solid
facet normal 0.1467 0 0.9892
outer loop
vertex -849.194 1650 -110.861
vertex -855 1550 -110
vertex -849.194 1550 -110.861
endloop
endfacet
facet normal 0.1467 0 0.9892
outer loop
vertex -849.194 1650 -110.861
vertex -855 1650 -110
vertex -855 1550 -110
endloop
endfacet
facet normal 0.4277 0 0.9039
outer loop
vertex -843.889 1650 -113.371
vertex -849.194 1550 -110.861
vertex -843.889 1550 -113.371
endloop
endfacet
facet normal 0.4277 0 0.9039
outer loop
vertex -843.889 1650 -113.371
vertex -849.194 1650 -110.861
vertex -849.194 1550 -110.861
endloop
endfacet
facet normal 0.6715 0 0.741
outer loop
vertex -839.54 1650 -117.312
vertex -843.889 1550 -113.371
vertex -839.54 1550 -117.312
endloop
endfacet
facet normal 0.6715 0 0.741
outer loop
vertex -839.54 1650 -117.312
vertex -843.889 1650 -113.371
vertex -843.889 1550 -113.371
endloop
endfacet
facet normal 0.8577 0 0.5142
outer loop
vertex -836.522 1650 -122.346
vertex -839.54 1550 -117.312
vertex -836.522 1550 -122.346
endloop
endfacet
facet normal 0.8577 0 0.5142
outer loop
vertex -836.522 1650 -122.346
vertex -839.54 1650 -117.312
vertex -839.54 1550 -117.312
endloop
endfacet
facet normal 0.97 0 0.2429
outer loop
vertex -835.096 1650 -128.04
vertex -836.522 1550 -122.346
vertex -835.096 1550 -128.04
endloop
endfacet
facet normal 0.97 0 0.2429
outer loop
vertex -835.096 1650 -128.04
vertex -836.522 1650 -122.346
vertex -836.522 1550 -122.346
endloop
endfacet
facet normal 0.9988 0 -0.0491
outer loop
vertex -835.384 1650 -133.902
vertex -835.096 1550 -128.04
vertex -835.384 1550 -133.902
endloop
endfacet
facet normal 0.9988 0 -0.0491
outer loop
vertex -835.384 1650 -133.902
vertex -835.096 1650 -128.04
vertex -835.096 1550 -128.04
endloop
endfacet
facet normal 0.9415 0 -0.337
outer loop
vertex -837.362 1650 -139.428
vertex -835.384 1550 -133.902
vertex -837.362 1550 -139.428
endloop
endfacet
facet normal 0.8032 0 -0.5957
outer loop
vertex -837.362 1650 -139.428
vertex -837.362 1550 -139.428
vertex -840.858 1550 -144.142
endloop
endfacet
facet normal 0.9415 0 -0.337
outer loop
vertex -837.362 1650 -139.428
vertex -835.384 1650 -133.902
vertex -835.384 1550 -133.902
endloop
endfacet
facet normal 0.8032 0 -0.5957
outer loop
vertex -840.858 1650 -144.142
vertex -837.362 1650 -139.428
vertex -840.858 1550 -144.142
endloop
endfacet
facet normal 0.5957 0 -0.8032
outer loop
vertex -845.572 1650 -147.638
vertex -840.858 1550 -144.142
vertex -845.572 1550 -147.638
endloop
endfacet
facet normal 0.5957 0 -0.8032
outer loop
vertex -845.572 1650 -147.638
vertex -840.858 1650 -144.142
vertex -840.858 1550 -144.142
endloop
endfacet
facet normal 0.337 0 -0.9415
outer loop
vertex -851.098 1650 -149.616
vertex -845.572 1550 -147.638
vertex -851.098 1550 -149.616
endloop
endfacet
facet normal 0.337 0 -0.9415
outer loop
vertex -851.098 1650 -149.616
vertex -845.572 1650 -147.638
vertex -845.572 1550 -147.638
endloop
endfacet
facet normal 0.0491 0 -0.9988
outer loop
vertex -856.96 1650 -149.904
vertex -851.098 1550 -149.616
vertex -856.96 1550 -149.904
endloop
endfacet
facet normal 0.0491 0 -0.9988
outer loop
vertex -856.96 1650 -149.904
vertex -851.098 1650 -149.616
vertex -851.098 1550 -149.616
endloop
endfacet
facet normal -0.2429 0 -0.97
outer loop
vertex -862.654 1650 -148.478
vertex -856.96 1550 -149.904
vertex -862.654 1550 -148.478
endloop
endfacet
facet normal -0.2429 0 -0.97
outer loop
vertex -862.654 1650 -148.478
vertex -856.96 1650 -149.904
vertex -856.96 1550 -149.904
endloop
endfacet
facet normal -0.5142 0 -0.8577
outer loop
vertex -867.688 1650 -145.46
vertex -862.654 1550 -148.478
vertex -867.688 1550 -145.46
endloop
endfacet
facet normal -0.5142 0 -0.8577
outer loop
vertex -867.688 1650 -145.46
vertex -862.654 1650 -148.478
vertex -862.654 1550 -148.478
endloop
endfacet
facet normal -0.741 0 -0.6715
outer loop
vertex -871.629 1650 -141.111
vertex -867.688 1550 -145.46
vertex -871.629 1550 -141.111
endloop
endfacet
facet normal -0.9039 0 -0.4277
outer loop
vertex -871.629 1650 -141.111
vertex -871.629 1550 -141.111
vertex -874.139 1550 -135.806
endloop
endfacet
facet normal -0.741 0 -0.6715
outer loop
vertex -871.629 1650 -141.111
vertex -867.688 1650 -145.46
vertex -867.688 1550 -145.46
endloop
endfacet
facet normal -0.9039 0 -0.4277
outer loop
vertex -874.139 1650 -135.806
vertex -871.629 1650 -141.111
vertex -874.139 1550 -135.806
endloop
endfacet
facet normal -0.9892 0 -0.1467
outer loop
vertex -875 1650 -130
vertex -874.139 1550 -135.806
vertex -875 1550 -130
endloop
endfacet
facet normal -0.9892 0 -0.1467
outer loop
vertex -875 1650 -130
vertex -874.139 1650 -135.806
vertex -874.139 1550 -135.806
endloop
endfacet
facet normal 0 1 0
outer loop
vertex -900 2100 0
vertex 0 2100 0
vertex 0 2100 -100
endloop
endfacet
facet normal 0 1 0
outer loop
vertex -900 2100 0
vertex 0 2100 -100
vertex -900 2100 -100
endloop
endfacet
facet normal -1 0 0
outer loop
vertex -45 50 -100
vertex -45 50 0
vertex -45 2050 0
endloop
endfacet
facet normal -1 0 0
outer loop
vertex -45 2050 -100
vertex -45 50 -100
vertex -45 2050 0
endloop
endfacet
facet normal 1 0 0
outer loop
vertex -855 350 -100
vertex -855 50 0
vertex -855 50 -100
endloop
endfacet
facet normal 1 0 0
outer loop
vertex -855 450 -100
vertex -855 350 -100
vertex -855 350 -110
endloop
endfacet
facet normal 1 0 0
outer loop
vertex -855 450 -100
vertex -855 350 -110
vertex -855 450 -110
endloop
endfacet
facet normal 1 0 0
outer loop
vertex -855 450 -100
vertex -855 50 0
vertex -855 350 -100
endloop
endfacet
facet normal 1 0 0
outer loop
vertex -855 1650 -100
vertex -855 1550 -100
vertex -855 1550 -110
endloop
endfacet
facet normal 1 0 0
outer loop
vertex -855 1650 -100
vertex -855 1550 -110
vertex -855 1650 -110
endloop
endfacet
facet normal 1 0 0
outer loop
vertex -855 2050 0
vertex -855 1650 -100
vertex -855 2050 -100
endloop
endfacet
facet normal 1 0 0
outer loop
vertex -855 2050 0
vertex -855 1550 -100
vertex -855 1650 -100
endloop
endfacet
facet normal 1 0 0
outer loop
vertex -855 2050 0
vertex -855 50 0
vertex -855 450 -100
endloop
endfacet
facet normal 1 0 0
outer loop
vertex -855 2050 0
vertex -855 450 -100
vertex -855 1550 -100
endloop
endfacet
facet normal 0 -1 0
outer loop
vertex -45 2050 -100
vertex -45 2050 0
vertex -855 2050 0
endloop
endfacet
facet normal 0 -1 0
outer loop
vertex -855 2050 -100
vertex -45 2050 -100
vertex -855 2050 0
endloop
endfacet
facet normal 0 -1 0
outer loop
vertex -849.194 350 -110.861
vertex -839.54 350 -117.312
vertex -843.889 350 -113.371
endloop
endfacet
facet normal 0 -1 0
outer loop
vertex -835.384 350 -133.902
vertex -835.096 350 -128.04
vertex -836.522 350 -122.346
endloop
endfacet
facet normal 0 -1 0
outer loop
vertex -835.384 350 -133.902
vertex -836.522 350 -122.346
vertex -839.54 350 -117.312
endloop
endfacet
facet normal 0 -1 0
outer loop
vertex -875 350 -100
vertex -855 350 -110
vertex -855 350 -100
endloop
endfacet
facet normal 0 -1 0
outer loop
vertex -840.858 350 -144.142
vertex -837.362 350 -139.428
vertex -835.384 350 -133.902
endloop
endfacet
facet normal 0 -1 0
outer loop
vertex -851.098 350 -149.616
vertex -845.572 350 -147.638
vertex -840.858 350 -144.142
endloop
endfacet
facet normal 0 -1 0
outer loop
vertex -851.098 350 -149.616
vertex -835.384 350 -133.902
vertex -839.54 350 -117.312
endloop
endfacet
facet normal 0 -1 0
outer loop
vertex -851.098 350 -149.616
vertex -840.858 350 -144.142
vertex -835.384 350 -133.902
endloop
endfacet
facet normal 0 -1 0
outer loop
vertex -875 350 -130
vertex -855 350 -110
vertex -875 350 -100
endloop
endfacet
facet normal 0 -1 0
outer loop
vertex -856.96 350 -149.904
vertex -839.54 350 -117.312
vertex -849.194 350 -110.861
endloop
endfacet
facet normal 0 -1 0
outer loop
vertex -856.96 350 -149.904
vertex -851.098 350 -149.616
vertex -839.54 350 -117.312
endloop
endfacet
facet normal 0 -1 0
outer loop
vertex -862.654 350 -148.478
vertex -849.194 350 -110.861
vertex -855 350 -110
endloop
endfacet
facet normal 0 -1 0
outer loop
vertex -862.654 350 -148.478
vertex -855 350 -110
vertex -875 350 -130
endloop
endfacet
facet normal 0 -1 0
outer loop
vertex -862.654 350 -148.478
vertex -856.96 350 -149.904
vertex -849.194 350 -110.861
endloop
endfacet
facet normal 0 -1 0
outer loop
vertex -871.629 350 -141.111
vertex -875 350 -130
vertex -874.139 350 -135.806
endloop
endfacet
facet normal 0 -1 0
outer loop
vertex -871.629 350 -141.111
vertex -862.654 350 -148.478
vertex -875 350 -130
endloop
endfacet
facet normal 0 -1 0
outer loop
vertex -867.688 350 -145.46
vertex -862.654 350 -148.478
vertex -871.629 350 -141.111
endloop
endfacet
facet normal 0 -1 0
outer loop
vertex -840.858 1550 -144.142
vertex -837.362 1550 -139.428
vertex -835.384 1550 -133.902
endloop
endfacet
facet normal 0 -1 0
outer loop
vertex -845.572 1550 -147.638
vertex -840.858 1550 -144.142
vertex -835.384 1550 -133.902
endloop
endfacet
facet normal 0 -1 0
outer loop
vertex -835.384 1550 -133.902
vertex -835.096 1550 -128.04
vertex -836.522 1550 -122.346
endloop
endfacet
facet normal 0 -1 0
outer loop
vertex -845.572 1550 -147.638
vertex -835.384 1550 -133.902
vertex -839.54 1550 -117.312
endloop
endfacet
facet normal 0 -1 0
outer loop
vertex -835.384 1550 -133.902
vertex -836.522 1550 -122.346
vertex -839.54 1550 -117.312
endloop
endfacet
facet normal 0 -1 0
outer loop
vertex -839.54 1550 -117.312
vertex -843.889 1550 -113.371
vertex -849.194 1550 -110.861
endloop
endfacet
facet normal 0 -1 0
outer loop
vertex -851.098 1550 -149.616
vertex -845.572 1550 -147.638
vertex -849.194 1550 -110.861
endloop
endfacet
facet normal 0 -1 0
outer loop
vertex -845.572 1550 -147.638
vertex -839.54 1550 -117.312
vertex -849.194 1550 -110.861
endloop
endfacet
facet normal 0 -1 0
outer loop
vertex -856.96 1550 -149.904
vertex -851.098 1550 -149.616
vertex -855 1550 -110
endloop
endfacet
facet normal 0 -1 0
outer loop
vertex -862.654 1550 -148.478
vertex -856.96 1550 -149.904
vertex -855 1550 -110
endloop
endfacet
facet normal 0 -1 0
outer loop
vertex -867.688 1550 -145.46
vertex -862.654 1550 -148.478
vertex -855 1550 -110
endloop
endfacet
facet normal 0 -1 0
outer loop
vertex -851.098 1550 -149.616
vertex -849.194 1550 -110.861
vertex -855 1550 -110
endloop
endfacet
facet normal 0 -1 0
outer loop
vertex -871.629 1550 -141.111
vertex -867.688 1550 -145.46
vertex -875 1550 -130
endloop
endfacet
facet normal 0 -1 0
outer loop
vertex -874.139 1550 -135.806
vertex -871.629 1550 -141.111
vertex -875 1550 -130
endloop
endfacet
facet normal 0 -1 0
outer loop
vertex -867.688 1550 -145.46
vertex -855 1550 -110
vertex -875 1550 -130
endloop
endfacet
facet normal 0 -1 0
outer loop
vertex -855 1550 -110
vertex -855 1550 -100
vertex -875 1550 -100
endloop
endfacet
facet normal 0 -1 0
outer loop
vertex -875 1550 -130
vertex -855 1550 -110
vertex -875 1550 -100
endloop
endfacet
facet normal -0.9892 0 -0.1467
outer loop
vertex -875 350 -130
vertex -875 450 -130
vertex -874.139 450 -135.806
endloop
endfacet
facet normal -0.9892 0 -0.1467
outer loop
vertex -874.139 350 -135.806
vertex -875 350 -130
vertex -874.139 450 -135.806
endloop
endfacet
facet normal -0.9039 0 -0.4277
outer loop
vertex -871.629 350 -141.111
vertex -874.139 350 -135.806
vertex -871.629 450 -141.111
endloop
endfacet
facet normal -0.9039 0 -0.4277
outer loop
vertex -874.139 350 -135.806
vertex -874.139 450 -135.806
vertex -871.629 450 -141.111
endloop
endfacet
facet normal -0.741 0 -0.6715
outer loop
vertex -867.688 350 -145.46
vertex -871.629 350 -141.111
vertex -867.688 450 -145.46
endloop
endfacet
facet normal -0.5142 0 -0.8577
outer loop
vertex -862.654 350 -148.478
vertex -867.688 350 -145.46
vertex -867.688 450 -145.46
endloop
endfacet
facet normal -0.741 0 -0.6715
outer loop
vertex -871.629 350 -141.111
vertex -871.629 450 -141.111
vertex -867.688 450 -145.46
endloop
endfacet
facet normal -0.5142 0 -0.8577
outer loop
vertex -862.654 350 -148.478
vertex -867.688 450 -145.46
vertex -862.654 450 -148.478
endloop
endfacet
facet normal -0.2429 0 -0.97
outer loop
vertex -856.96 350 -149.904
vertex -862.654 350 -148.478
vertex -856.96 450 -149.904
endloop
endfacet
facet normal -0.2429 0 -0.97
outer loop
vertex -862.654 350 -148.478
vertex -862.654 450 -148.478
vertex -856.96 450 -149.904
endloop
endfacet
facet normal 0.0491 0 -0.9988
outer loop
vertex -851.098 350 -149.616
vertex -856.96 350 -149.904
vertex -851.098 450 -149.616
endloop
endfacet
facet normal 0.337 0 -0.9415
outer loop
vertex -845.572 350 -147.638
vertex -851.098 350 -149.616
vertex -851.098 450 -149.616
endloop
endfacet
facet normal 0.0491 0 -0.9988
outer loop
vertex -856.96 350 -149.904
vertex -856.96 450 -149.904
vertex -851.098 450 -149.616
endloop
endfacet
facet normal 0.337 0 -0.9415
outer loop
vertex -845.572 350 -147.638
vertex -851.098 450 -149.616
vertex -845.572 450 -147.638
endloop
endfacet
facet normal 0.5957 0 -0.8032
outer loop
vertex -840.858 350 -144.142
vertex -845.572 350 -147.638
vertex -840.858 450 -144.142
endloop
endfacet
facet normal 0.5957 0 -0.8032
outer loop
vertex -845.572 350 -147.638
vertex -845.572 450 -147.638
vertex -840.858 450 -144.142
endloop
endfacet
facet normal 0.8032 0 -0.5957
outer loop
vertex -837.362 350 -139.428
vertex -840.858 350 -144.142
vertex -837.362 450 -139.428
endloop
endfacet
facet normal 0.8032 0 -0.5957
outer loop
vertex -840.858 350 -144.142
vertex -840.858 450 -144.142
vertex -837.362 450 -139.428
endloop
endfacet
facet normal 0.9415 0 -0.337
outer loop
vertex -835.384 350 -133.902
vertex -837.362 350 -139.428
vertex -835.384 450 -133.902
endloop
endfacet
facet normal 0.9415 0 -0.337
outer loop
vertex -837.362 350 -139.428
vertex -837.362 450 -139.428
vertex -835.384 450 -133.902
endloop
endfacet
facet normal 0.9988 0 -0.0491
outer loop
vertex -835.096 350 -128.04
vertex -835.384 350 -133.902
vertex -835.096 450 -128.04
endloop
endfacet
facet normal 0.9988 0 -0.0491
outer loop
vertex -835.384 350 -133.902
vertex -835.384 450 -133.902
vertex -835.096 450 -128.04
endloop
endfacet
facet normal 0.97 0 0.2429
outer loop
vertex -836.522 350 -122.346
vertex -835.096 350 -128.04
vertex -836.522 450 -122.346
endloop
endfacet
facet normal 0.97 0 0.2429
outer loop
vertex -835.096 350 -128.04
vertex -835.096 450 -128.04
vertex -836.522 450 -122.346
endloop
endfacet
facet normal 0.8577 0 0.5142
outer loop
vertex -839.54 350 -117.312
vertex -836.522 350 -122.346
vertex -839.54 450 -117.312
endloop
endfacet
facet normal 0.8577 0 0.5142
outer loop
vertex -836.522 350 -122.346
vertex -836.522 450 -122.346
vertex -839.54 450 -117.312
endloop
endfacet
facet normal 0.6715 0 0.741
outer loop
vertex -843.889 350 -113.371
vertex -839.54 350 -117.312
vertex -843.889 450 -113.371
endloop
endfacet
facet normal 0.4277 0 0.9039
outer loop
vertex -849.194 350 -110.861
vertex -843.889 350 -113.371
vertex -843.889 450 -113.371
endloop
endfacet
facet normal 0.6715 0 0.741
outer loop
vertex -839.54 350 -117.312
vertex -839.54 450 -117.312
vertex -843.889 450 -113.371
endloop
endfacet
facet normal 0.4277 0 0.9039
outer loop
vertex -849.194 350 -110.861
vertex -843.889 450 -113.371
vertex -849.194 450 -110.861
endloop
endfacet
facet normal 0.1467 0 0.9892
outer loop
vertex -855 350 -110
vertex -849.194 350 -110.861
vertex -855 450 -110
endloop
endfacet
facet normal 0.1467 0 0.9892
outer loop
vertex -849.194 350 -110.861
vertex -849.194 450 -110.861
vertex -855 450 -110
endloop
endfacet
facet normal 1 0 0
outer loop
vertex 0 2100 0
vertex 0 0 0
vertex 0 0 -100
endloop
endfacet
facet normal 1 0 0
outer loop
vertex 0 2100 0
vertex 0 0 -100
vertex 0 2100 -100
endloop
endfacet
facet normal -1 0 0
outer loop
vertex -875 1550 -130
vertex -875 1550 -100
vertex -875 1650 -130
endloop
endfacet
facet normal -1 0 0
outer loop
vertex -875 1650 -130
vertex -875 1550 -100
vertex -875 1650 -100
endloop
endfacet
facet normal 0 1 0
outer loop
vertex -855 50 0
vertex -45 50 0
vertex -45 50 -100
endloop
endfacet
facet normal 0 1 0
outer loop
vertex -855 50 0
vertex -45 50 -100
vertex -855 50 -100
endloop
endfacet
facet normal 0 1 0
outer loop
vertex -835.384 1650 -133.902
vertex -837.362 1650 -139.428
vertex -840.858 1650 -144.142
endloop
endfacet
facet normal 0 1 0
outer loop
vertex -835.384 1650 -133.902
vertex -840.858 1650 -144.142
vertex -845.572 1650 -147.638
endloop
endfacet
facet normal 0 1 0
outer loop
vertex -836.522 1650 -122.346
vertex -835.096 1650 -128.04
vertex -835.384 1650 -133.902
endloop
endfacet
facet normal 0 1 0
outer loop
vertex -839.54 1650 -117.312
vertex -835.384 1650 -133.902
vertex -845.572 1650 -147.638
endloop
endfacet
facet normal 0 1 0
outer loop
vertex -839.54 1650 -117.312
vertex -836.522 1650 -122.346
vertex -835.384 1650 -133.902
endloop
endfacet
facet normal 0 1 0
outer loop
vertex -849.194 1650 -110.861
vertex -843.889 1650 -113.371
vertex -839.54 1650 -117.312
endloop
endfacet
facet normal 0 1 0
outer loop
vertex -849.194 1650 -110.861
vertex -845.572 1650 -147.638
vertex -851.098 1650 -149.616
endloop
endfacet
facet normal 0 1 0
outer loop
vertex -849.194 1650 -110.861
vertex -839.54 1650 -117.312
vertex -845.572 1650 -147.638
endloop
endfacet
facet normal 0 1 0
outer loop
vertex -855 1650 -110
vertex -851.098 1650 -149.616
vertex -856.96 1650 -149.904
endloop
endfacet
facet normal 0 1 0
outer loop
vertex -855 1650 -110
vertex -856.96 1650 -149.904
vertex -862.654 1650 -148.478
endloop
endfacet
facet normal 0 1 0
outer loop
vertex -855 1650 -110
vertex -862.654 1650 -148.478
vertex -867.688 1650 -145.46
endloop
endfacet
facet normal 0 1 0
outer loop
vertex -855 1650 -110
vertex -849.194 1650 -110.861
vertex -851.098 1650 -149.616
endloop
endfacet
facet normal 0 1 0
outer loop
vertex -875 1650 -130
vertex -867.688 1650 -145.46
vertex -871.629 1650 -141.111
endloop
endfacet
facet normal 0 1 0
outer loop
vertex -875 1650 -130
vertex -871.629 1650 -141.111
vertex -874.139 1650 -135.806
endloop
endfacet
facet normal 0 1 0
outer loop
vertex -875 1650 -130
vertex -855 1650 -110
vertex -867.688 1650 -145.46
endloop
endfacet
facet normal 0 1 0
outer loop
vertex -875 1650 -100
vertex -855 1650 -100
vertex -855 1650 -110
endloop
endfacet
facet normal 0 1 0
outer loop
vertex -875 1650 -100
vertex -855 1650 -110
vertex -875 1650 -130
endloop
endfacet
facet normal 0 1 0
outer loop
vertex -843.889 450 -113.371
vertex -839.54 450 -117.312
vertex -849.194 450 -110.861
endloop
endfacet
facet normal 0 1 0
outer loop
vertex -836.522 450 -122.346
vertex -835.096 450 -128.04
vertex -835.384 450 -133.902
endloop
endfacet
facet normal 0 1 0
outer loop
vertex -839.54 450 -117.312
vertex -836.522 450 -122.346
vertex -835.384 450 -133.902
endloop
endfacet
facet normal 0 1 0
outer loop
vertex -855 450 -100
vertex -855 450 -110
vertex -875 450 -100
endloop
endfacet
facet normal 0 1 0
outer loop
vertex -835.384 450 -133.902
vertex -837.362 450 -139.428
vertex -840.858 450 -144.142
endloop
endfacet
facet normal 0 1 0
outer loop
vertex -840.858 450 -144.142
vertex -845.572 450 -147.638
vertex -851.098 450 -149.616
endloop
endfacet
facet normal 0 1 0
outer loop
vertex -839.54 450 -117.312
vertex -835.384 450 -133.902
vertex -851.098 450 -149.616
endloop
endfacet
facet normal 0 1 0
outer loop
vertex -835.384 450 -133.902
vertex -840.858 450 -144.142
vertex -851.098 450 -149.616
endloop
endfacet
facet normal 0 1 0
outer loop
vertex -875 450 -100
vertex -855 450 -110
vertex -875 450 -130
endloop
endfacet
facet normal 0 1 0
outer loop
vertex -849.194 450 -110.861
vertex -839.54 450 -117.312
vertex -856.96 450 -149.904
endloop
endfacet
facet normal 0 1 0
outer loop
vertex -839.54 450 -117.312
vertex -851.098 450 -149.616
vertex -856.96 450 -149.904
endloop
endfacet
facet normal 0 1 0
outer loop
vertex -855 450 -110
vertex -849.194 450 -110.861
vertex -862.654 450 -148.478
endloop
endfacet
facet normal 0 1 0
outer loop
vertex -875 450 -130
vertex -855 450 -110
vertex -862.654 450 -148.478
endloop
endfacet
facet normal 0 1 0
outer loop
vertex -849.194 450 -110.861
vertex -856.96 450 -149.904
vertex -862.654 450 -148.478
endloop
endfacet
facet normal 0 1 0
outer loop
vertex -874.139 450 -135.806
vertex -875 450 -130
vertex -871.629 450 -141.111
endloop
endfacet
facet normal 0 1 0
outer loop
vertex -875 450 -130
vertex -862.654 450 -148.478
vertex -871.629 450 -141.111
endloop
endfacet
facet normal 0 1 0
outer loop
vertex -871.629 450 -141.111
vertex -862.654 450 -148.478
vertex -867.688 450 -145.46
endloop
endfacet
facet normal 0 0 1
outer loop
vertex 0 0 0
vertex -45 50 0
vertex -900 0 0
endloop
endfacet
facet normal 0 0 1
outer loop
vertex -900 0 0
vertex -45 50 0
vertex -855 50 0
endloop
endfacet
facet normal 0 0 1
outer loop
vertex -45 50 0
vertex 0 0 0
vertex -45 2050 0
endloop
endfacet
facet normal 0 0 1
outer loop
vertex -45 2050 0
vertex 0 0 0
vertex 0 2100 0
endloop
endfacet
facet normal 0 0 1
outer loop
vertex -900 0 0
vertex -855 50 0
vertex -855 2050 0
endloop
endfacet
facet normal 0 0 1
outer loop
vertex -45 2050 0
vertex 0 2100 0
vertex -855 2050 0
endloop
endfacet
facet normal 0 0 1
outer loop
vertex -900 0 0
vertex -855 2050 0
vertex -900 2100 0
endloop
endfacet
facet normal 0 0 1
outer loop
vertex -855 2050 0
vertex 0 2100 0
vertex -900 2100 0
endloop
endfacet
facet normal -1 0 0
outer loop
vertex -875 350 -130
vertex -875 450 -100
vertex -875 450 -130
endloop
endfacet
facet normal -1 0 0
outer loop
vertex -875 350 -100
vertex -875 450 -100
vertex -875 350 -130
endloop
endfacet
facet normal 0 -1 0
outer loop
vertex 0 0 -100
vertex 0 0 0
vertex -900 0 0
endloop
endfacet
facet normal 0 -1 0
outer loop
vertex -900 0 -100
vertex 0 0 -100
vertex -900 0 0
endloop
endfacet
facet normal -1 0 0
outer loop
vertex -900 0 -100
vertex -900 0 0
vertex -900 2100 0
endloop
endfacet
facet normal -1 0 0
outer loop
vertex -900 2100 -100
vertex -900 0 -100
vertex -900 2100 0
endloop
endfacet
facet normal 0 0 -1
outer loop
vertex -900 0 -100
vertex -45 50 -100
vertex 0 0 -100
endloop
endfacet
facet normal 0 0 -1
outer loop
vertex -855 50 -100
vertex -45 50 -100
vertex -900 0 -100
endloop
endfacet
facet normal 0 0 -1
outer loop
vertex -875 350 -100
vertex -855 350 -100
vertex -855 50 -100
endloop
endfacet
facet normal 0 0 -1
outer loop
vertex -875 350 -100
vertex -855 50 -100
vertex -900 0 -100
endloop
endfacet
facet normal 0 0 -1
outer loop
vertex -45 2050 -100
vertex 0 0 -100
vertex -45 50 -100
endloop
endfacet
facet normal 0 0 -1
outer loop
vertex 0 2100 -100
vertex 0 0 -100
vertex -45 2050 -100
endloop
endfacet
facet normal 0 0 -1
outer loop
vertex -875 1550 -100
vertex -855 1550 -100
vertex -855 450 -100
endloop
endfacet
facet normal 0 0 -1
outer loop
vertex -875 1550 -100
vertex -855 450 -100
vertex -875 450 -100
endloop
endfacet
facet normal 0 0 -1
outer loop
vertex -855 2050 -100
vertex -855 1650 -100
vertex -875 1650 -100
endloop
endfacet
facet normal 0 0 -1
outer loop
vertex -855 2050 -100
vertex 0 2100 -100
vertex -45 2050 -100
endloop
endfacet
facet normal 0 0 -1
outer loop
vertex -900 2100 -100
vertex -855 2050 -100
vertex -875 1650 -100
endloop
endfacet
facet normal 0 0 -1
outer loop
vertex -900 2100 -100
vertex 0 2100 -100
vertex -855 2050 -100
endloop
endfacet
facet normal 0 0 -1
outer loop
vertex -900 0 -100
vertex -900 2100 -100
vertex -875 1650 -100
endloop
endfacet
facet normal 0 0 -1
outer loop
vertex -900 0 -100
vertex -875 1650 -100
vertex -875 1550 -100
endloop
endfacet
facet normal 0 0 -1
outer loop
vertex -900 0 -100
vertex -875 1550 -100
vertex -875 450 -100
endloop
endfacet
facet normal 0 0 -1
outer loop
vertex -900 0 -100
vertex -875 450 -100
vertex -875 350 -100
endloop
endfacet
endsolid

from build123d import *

# Parameters (mm, degrees)
SKETCH_1_W               = 900
SKETCH_1_H               = 2100
SKETCH_1_W_2             = 810
SKETCH_1_H_2             = 2000
EXTRUDE_1_DEPTH          = 100
SKETCH_2_W               = 20
SKETCH_2_H               = 100
EXTRUDE_2_DEPTH          = 30
SKETCH_3_R               = 20
EXTRUDE_3_DEPTH          = 100
PATTERN_LINEAR_1_COUNT   = 2
PATTERN_LINEAR_1_PITCH   = 1200
MIRROR_1_COPY_1_SKETCH_W = 20
MIRROR_1_COPY_1_SKETCH_H = 100
MIRROR_1_COPY_1_DEPTH    = 30
MIRROR_1_COPY_2_SKETCH_R = 20
MIRROR_1_COPY_2_DEPTH    = 100
DELETE_FACE_1_OUTLINE_W  = 41
DELETE_FACE_1_OUTLINE_H  = 100
DELETE_FACE_1_DEPTH      = 50


# Read off the part's stored shape, not the designer's step: Удалить грань1
with BuildPart() as part:
    # Эскиз1 → Бобышка-Вытянуть1 (new body)
    with BuildSketch(Plane.XY):
        with Locations((450, 1050)):
            Rectangle(SKETCH_1_W, SKETCH_1_H)
        with Locations((450, 1050)):
            Rectangle(SKETCH_1_W_2, SKETCH_1_H_2, mode=Mode.SUBTRACT)
    extrude(amount=-EXTRUDE_1_DEPTH)

    # Эскиз2 → Бобышка-Вытянуть2 (add)
    with BuildSketch(Plane.XY):
        with Locations((865, 1600)):
            Rectangle(SKETCH_2_W, SKETCH_2_H)
    extrude_2 = extrude(amount=EXTRUDE_2_DEPTH)

    # Эскиз3 → Бобышка-Вытянуть3 (add)
    with BuildSketch(Plane(origin=(0, 1650, 0), x_dir=(1, 0, 0), z_dir=(0, 1, 0))):
        with Locations((855, -30)):
            Circle(SKETCH_3_R)
    extrude_3 = extrude(amount=-EXTRUDE_3_DEPTH)

    # Линейный массив1: Бобышка-Вытянуть2, Бобышка-Вытянуть3 ×2
    with Locations(*[(0, -i * PATTERN_LINEAR_1_PITCH, 0) for i in range(1, PATTERN_LINEAR_1_COUNT)]):
        add(extrude_2)
        add(extrude_3)

    # Зеркальное отражение1: Бобышка-Вытянуть2, Бобышка-Вытянуть3 across plane
    add(extrude_2.mirror(Plane.XY.offset(-50)))
    add(extrude_3.mirror(Plane.XY.offset(-50)))

    # Зеркальное отражение1 copy 1 sketch → Зеркальное отражение1 copy 1 (add)
    with BuildSketch(Plane(origin=(0, -1200, -100), x_dir=(1, 0, 0), z_dir=(0, 0, -1))):
        with Locations((865, -1600)):
            Rectangle(MIRROR_1_COPY_1_SKETCH_W, MIRROR_1_COPY_1_SKETCH_H)
    extrude(amount=MIRROR_1_COPY_1_DEPTH)

    # Зеркальное отражение1 copy 2 sketch → Зеркальное отражение1 copy 2 (add)
    with BuildSketch(Plane(origin=(0, 450, -100), x_dir=(1, 0, 0), z_dir=(0, 1, 0))):
        with Locations((855, 30)):
            Circle(MIRROR_1_COPY_2_SKETCH_R)
    extrude(amount=-MIRROR_1_COPY_2_DEPTH)

    # Delete Face 1 outline → Delete Face 1 (cut)
    with BuildSketch(Plane.XY):
        with Locations((854.5, 1600)):
            Rectangle(DELETE_FACE_1_OUTLINE_W, DELETE_FACE_1_OUTLINE_H)
        with Locations((854.5, 400)):
            Rectangle(DELETE_FACE_1_OUTLINE_W, DELETE_FACE_1_OUTLINE_H)
    extrude(amount=DELETE_FACE_1_DEPTH, mode=Mode.SUBTRACT)


with BuildPart() as body_2:
    # Зеркальное отражение2: mirrored copy
    add(part.part.mirror(Plane(origin=(0, 0, 0), x_dir=(0, 0, 1), z_dir=(1, 0, 0))))


solid = body_2.part
